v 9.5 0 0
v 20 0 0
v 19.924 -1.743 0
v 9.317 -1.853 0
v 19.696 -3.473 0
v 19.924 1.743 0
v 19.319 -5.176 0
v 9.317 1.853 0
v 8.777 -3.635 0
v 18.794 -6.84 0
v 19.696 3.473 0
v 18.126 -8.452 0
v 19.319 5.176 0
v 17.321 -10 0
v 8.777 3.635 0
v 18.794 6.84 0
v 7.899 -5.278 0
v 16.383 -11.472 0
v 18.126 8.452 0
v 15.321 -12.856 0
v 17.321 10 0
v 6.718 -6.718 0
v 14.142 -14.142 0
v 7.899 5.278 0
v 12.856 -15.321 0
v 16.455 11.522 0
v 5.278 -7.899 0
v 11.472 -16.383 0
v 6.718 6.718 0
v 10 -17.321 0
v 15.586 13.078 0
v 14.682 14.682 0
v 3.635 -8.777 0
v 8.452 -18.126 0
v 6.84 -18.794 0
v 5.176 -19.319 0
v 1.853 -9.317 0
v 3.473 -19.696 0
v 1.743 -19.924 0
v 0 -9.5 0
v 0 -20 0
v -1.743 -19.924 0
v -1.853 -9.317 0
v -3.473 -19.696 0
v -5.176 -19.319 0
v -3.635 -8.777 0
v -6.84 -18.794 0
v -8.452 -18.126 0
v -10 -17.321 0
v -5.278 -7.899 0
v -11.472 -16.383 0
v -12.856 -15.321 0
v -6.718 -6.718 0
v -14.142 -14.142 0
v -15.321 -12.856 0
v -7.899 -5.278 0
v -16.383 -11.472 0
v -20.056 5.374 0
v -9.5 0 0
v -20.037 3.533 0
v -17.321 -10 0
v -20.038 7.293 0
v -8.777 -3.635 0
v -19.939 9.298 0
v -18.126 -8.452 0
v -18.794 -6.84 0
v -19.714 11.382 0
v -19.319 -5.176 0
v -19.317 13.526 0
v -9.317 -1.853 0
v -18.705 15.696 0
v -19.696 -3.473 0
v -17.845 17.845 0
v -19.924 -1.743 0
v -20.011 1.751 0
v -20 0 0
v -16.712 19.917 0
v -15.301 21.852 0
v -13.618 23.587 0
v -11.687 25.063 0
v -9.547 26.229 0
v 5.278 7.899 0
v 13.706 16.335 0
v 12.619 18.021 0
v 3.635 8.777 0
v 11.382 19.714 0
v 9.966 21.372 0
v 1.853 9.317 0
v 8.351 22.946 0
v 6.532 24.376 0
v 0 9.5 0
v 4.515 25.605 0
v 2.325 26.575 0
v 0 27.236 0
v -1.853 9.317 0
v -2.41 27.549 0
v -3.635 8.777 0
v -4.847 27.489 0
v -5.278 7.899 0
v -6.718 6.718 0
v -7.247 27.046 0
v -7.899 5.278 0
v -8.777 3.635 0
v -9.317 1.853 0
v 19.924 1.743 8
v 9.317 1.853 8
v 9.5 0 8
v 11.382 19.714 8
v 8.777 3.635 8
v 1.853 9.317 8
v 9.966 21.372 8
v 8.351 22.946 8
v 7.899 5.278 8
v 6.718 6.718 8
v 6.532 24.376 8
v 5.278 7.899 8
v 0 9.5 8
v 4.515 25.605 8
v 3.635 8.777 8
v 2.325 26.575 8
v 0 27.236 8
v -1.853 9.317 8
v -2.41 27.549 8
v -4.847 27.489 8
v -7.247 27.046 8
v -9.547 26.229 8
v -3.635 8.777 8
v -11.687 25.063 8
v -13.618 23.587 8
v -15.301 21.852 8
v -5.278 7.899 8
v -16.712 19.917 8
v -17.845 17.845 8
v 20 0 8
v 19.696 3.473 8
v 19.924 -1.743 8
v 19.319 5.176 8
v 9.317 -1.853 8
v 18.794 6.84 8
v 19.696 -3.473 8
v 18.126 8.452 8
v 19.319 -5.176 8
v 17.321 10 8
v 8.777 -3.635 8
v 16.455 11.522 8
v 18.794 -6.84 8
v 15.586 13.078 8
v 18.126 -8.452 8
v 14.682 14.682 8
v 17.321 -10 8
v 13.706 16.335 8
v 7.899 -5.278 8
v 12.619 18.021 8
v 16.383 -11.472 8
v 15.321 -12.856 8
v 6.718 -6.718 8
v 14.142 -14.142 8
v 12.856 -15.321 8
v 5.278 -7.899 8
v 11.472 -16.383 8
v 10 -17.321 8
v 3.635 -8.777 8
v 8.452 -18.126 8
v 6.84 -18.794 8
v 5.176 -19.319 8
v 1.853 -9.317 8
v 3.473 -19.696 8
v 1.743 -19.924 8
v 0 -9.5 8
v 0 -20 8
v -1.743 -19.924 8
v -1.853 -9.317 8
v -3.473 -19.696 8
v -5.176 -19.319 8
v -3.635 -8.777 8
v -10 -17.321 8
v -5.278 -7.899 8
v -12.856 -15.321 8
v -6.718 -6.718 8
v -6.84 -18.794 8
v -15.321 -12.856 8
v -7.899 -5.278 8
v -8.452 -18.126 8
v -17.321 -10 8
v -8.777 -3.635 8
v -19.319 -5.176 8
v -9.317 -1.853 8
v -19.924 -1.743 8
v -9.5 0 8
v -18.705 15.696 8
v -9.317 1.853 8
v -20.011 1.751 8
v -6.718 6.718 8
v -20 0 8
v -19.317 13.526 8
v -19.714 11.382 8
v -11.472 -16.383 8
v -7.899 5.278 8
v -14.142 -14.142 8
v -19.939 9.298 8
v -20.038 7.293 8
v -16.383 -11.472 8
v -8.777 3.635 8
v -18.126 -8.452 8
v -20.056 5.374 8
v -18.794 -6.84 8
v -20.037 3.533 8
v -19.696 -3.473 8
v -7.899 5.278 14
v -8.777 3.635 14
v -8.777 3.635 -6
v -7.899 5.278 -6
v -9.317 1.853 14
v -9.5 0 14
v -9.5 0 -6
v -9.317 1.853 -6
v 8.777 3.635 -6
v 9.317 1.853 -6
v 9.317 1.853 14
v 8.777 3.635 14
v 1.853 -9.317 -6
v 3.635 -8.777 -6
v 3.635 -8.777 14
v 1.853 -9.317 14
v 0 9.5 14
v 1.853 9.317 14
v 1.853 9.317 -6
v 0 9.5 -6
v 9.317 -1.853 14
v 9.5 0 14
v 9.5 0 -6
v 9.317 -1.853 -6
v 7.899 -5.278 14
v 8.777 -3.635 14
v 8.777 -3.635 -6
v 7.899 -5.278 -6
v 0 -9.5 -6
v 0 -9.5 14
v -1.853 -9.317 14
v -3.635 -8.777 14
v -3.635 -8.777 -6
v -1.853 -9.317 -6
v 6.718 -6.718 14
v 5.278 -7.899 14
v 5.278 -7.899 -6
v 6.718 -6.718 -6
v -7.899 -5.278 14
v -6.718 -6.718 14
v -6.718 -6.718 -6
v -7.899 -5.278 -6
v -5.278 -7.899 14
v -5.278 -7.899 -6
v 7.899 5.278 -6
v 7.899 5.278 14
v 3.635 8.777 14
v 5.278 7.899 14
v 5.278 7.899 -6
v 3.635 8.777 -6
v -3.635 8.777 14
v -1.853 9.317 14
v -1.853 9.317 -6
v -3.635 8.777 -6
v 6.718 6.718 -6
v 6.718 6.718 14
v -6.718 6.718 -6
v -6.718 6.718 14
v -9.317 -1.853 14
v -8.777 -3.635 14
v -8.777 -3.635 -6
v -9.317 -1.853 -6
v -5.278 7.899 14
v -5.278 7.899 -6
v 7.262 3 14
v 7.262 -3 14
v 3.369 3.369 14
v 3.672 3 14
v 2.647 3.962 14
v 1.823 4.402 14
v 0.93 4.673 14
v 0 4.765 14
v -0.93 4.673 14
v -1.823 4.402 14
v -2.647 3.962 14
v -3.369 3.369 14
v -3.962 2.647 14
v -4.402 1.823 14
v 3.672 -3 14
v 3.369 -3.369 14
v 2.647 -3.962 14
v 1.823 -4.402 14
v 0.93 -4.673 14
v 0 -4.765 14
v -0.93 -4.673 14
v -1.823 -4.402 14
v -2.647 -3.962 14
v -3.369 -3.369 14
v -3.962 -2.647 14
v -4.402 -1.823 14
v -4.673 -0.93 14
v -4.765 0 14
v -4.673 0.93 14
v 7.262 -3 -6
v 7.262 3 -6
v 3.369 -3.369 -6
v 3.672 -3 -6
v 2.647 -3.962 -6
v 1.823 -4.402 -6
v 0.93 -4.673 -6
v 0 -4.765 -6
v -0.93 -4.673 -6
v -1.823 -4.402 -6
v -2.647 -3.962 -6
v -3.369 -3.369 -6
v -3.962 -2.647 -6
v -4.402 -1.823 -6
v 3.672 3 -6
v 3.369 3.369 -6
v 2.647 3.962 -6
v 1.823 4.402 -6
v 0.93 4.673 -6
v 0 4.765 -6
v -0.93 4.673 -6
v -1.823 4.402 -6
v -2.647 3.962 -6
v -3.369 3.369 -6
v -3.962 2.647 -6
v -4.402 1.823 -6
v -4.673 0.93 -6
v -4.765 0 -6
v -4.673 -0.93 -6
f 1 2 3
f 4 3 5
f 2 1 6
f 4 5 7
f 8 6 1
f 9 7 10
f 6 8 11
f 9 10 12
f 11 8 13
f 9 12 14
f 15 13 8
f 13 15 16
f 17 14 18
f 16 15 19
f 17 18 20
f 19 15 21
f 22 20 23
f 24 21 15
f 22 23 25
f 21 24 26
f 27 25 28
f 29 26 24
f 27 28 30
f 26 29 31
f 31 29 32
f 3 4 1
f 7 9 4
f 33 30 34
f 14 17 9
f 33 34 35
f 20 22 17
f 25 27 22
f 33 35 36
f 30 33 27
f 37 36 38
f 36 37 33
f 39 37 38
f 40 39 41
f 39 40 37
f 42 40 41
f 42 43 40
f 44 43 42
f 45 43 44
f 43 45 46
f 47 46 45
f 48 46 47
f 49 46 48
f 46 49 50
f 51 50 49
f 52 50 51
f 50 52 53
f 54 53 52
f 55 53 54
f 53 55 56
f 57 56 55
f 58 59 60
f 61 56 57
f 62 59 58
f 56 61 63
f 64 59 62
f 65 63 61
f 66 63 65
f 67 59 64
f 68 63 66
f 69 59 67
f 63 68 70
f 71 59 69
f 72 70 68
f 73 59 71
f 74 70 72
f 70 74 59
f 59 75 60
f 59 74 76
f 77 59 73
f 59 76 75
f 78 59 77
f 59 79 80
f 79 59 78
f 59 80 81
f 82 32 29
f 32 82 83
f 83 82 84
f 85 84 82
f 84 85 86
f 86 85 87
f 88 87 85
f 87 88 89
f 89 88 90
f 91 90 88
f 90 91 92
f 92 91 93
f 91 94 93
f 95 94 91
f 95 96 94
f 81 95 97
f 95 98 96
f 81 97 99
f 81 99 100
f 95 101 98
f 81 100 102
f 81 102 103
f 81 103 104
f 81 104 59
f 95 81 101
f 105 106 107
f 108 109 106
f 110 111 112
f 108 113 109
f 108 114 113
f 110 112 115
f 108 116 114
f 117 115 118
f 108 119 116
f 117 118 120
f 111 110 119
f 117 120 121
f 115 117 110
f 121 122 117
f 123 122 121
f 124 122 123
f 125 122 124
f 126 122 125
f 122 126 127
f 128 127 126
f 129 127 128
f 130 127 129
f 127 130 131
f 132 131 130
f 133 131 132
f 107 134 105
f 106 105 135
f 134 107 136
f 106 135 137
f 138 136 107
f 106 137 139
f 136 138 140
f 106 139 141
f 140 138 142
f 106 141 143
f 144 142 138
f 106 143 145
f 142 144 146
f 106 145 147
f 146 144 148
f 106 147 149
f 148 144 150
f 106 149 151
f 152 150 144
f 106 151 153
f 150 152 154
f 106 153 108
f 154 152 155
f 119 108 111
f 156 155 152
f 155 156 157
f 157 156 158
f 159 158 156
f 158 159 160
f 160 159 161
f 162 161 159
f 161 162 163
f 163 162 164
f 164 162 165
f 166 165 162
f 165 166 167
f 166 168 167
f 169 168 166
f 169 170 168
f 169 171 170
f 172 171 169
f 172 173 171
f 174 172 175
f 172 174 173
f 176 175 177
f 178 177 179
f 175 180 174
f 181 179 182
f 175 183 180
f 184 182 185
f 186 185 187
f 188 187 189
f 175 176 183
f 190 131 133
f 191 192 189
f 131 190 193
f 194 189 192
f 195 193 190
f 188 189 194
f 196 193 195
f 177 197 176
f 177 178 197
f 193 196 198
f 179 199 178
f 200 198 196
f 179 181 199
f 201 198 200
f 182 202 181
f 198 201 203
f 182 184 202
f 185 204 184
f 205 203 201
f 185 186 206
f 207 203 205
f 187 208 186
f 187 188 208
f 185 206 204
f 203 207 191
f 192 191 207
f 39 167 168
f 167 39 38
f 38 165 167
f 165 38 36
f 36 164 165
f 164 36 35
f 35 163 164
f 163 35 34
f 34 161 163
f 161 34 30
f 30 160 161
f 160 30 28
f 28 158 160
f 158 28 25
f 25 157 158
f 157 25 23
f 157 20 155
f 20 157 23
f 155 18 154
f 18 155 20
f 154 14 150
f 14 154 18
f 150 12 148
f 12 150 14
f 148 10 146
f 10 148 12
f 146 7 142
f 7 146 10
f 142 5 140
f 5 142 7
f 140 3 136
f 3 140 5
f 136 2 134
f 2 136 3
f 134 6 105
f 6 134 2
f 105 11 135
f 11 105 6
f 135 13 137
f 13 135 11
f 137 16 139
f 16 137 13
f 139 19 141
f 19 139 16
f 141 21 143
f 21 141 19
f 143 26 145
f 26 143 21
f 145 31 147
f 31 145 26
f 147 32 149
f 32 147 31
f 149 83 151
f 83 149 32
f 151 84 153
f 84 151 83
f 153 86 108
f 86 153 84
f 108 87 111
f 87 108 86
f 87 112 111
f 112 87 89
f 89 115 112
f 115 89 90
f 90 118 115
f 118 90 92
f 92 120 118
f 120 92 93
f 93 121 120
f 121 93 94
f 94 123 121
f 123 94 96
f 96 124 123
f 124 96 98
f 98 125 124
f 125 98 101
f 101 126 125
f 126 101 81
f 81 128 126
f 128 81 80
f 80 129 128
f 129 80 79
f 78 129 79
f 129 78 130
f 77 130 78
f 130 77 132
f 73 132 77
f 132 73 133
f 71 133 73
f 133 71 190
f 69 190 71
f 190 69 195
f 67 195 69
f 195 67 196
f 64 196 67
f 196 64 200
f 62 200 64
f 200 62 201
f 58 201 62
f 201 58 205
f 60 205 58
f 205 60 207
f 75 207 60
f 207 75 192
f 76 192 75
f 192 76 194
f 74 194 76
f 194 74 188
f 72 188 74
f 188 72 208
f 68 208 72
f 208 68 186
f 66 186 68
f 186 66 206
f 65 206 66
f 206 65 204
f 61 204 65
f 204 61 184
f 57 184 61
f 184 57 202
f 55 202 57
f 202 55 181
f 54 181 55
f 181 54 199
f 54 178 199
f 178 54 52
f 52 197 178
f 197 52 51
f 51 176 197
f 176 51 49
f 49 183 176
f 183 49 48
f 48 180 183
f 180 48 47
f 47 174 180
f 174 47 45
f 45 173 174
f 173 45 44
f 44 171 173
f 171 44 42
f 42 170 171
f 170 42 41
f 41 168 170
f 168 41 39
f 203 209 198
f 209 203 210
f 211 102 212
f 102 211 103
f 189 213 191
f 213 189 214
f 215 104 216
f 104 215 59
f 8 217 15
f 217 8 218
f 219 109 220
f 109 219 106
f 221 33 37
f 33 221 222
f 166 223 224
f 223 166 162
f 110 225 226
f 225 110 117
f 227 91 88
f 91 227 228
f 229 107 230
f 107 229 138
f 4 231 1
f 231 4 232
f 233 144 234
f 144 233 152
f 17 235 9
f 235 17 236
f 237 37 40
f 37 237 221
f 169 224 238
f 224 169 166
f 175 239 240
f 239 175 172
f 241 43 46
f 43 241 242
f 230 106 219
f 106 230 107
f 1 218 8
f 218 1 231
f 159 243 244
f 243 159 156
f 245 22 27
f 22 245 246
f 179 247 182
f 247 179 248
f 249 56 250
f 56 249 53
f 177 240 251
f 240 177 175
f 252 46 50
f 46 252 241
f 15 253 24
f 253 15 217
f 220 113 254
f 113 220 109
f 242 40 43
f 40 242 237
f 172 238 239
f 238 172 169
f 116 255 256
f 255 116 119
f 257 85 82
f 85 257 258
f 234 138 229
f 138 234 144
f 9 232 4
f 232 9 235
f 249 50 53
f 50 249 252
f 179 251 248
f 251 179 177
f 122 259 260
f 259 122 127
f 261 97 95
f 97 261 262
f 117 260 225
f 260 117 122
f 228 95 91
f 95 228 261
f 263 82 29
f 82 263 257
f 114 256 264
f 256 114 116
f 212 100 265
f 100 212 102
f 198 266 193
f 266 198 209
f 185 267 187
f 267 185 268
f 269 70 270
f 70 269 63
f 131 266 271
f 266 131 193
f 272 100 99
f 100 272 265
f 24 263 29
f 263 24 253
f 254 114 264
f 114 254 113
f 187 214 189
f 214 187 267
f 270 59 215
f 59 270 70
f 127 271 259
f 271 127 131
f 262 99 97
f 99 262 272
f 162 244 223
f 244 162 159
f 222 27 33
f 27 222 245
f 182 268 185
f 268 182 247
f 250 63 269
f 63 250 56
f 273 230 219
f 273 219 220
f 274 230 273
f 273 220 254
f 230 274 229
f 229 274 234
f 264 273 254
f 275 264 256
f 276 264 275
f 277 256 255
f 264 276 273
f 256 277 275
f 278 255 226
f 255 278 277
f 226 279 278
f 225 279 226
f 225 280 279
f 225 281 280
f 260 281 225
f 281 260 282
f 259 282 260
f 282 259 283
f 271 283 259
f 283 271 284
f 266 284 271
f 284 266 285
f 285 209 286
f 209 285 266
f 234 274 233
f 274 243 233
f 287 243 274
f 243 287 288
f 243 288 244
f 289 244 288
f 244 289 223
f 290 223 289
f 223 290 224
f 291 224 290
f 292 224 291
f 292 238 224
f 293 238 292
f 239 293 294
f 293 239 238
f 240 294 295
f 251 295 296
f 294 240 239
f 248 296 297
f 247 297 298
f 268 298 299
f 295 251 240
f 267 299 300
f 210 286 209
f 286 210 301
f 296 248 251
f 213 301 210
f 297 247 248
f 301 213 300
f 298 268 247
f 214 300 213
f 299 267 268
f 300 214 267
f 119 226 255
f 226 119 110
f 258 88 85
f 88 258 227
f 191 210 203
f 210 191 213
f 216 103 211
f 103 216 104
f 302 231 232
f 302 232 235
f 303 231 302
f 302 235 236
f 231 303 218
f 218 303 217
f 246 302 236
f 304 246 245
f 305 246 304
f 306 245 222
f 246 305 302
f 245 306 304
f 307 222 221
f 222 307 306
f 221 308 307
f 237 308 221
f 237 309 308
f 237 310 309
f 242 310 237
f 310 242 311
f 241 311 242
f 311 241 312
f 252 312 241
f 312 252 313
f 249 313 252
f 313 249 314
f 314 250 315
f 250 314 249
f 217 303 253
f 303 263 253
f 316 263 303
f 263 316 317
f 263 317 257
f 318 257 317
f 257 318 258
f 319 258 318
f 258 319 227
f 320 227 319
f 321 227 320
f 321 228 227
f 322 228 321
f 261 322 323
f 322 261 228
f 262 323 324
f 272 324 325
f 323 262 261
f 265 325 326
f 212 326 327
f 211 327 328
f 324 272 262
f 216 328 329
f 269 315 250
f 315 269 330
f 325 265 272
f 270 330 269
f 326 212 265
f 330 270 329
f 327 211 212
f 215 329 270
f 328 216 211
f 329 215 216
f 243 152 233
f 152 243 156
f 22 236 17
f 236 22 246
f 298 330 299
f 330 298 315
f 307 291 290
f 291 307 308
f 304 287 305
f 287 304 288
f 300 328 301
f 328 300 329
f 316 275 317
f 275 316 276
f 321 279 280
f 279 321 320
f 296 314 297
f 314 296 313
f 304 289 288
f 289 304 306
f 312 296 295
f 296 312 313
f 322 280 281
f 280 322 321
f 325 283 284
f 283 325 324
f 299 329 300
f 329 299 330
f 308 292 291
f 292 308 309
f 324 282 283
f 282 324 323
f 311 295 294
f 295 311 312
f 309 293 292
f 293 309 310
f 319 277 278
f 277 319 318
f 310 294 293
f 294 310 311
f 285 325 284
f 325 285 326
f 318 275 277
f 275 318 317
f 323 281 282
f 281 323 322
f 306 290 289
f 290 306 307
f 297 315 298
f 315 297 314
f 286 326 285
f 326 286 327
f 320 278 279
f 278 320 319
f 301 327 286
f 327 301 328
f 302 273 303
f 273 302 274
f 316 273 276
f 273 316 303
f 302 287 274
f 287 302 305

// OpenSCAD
$fn = 32;

// ----------------------------------------------------------------------
// Cam: base radius 20 mm with a 8 mm lift over 150 degrees
// ----------------------------------------------------------------------

// --- parameters (mm) ---
base_r = 20;              // base radius
lift = 8;                 // lift height above the base radius
lift_span = 150;          // angular width of the lift
lift_start = 30;          // angle where the lift starts
cam_t = 8;                // cam plate thickness
hub_d = 19;               // hub diameter
hub_h = 20;               // hub height
bore_d = 9.53;            // bore
key_w = 6;                // keyway width
key_depth = 2.74;         // keyway depth

cam_profile = [[20, 0], [19.924, 1.743], [19.696, 3.473], [19.319, 5.176], [18.794, 6.84], [18.126, 8.452], [17.321, 10], [16.455, 11.522], [15.586, 13.078], [14.682, 14.682], [13.706, 16.335], [12.619, 18.021], [11.382, 19.714], [9.966, 21.372], [8.351, 22.946], [6.532, 24.376], [4.515, 25.605], [2.325, 26.575], [0, 27.236], [-2.41, 27.549], [-4.847, 27.489], [-7.247, 27.046], [-9.547, 26.229], [-11.687, 25.063], [-13.618, 23.587], [-15.301, 21.852], [-16.712, 19.917], [-17.845, 17.845], [-18.705, 15.696], [-19.317, 13.526], [-19.714, 11.382], [-19.939, 9.298], [-20.038, 7.293], [-20.056, 5.374], [-20.037, 3.533], [-20.011, 1.751], [-20, 0], [-19.924, -1.743], [-19.696, -3.473], [-19.319, -5.176], [-18.794, -6.84], [-18.126, -8.452], [-17.321, -10], [-16.383, -11.472], [-15.321, -12.856], [-14.142, -14.142], [-12.856, -15.321], [-11.472, -16.383], [-10, -17.321], [-8.452, -18.126], [-6.84, -18.794], [-5.176, -19.319], [-3.473, -19.696], [-1.743, -19.924], [0, -20], [1.743, -19.924], [3.473, -19.696], [5.176, -19.319], [6.84, -18.794], [8.452, -18.126], [10, -17.321], [11.472, -16.383], [12.856, -15.321], [14.142, -14.142], [15.321, -12.856], [16.383, -11.472], [17.321, -10], [18.126, -8.452], [18.794, -6.84], [19.319, -5.176], [19.696, -3.473], [19.924, -1.743]];

difference() {
  union() {
    linear_extrude(height = cam_t) polygon(cam_profile);
    /* hub, proud of the cam plate on both sides */
    translate([0, 0, -6]) cylinder(h = hub_h, d = hub_d);
  }
  /* bore through the hub, 2.5 mm clear on both faces */
  translate([0, 0, -8.5]) cylinder(h = hub_h + 5, d = bore_d);
  /* keyway, milled through the whole hub */
  translate([2.022, -3, -8.5]) cube([5.24, 6, 25]);
}
